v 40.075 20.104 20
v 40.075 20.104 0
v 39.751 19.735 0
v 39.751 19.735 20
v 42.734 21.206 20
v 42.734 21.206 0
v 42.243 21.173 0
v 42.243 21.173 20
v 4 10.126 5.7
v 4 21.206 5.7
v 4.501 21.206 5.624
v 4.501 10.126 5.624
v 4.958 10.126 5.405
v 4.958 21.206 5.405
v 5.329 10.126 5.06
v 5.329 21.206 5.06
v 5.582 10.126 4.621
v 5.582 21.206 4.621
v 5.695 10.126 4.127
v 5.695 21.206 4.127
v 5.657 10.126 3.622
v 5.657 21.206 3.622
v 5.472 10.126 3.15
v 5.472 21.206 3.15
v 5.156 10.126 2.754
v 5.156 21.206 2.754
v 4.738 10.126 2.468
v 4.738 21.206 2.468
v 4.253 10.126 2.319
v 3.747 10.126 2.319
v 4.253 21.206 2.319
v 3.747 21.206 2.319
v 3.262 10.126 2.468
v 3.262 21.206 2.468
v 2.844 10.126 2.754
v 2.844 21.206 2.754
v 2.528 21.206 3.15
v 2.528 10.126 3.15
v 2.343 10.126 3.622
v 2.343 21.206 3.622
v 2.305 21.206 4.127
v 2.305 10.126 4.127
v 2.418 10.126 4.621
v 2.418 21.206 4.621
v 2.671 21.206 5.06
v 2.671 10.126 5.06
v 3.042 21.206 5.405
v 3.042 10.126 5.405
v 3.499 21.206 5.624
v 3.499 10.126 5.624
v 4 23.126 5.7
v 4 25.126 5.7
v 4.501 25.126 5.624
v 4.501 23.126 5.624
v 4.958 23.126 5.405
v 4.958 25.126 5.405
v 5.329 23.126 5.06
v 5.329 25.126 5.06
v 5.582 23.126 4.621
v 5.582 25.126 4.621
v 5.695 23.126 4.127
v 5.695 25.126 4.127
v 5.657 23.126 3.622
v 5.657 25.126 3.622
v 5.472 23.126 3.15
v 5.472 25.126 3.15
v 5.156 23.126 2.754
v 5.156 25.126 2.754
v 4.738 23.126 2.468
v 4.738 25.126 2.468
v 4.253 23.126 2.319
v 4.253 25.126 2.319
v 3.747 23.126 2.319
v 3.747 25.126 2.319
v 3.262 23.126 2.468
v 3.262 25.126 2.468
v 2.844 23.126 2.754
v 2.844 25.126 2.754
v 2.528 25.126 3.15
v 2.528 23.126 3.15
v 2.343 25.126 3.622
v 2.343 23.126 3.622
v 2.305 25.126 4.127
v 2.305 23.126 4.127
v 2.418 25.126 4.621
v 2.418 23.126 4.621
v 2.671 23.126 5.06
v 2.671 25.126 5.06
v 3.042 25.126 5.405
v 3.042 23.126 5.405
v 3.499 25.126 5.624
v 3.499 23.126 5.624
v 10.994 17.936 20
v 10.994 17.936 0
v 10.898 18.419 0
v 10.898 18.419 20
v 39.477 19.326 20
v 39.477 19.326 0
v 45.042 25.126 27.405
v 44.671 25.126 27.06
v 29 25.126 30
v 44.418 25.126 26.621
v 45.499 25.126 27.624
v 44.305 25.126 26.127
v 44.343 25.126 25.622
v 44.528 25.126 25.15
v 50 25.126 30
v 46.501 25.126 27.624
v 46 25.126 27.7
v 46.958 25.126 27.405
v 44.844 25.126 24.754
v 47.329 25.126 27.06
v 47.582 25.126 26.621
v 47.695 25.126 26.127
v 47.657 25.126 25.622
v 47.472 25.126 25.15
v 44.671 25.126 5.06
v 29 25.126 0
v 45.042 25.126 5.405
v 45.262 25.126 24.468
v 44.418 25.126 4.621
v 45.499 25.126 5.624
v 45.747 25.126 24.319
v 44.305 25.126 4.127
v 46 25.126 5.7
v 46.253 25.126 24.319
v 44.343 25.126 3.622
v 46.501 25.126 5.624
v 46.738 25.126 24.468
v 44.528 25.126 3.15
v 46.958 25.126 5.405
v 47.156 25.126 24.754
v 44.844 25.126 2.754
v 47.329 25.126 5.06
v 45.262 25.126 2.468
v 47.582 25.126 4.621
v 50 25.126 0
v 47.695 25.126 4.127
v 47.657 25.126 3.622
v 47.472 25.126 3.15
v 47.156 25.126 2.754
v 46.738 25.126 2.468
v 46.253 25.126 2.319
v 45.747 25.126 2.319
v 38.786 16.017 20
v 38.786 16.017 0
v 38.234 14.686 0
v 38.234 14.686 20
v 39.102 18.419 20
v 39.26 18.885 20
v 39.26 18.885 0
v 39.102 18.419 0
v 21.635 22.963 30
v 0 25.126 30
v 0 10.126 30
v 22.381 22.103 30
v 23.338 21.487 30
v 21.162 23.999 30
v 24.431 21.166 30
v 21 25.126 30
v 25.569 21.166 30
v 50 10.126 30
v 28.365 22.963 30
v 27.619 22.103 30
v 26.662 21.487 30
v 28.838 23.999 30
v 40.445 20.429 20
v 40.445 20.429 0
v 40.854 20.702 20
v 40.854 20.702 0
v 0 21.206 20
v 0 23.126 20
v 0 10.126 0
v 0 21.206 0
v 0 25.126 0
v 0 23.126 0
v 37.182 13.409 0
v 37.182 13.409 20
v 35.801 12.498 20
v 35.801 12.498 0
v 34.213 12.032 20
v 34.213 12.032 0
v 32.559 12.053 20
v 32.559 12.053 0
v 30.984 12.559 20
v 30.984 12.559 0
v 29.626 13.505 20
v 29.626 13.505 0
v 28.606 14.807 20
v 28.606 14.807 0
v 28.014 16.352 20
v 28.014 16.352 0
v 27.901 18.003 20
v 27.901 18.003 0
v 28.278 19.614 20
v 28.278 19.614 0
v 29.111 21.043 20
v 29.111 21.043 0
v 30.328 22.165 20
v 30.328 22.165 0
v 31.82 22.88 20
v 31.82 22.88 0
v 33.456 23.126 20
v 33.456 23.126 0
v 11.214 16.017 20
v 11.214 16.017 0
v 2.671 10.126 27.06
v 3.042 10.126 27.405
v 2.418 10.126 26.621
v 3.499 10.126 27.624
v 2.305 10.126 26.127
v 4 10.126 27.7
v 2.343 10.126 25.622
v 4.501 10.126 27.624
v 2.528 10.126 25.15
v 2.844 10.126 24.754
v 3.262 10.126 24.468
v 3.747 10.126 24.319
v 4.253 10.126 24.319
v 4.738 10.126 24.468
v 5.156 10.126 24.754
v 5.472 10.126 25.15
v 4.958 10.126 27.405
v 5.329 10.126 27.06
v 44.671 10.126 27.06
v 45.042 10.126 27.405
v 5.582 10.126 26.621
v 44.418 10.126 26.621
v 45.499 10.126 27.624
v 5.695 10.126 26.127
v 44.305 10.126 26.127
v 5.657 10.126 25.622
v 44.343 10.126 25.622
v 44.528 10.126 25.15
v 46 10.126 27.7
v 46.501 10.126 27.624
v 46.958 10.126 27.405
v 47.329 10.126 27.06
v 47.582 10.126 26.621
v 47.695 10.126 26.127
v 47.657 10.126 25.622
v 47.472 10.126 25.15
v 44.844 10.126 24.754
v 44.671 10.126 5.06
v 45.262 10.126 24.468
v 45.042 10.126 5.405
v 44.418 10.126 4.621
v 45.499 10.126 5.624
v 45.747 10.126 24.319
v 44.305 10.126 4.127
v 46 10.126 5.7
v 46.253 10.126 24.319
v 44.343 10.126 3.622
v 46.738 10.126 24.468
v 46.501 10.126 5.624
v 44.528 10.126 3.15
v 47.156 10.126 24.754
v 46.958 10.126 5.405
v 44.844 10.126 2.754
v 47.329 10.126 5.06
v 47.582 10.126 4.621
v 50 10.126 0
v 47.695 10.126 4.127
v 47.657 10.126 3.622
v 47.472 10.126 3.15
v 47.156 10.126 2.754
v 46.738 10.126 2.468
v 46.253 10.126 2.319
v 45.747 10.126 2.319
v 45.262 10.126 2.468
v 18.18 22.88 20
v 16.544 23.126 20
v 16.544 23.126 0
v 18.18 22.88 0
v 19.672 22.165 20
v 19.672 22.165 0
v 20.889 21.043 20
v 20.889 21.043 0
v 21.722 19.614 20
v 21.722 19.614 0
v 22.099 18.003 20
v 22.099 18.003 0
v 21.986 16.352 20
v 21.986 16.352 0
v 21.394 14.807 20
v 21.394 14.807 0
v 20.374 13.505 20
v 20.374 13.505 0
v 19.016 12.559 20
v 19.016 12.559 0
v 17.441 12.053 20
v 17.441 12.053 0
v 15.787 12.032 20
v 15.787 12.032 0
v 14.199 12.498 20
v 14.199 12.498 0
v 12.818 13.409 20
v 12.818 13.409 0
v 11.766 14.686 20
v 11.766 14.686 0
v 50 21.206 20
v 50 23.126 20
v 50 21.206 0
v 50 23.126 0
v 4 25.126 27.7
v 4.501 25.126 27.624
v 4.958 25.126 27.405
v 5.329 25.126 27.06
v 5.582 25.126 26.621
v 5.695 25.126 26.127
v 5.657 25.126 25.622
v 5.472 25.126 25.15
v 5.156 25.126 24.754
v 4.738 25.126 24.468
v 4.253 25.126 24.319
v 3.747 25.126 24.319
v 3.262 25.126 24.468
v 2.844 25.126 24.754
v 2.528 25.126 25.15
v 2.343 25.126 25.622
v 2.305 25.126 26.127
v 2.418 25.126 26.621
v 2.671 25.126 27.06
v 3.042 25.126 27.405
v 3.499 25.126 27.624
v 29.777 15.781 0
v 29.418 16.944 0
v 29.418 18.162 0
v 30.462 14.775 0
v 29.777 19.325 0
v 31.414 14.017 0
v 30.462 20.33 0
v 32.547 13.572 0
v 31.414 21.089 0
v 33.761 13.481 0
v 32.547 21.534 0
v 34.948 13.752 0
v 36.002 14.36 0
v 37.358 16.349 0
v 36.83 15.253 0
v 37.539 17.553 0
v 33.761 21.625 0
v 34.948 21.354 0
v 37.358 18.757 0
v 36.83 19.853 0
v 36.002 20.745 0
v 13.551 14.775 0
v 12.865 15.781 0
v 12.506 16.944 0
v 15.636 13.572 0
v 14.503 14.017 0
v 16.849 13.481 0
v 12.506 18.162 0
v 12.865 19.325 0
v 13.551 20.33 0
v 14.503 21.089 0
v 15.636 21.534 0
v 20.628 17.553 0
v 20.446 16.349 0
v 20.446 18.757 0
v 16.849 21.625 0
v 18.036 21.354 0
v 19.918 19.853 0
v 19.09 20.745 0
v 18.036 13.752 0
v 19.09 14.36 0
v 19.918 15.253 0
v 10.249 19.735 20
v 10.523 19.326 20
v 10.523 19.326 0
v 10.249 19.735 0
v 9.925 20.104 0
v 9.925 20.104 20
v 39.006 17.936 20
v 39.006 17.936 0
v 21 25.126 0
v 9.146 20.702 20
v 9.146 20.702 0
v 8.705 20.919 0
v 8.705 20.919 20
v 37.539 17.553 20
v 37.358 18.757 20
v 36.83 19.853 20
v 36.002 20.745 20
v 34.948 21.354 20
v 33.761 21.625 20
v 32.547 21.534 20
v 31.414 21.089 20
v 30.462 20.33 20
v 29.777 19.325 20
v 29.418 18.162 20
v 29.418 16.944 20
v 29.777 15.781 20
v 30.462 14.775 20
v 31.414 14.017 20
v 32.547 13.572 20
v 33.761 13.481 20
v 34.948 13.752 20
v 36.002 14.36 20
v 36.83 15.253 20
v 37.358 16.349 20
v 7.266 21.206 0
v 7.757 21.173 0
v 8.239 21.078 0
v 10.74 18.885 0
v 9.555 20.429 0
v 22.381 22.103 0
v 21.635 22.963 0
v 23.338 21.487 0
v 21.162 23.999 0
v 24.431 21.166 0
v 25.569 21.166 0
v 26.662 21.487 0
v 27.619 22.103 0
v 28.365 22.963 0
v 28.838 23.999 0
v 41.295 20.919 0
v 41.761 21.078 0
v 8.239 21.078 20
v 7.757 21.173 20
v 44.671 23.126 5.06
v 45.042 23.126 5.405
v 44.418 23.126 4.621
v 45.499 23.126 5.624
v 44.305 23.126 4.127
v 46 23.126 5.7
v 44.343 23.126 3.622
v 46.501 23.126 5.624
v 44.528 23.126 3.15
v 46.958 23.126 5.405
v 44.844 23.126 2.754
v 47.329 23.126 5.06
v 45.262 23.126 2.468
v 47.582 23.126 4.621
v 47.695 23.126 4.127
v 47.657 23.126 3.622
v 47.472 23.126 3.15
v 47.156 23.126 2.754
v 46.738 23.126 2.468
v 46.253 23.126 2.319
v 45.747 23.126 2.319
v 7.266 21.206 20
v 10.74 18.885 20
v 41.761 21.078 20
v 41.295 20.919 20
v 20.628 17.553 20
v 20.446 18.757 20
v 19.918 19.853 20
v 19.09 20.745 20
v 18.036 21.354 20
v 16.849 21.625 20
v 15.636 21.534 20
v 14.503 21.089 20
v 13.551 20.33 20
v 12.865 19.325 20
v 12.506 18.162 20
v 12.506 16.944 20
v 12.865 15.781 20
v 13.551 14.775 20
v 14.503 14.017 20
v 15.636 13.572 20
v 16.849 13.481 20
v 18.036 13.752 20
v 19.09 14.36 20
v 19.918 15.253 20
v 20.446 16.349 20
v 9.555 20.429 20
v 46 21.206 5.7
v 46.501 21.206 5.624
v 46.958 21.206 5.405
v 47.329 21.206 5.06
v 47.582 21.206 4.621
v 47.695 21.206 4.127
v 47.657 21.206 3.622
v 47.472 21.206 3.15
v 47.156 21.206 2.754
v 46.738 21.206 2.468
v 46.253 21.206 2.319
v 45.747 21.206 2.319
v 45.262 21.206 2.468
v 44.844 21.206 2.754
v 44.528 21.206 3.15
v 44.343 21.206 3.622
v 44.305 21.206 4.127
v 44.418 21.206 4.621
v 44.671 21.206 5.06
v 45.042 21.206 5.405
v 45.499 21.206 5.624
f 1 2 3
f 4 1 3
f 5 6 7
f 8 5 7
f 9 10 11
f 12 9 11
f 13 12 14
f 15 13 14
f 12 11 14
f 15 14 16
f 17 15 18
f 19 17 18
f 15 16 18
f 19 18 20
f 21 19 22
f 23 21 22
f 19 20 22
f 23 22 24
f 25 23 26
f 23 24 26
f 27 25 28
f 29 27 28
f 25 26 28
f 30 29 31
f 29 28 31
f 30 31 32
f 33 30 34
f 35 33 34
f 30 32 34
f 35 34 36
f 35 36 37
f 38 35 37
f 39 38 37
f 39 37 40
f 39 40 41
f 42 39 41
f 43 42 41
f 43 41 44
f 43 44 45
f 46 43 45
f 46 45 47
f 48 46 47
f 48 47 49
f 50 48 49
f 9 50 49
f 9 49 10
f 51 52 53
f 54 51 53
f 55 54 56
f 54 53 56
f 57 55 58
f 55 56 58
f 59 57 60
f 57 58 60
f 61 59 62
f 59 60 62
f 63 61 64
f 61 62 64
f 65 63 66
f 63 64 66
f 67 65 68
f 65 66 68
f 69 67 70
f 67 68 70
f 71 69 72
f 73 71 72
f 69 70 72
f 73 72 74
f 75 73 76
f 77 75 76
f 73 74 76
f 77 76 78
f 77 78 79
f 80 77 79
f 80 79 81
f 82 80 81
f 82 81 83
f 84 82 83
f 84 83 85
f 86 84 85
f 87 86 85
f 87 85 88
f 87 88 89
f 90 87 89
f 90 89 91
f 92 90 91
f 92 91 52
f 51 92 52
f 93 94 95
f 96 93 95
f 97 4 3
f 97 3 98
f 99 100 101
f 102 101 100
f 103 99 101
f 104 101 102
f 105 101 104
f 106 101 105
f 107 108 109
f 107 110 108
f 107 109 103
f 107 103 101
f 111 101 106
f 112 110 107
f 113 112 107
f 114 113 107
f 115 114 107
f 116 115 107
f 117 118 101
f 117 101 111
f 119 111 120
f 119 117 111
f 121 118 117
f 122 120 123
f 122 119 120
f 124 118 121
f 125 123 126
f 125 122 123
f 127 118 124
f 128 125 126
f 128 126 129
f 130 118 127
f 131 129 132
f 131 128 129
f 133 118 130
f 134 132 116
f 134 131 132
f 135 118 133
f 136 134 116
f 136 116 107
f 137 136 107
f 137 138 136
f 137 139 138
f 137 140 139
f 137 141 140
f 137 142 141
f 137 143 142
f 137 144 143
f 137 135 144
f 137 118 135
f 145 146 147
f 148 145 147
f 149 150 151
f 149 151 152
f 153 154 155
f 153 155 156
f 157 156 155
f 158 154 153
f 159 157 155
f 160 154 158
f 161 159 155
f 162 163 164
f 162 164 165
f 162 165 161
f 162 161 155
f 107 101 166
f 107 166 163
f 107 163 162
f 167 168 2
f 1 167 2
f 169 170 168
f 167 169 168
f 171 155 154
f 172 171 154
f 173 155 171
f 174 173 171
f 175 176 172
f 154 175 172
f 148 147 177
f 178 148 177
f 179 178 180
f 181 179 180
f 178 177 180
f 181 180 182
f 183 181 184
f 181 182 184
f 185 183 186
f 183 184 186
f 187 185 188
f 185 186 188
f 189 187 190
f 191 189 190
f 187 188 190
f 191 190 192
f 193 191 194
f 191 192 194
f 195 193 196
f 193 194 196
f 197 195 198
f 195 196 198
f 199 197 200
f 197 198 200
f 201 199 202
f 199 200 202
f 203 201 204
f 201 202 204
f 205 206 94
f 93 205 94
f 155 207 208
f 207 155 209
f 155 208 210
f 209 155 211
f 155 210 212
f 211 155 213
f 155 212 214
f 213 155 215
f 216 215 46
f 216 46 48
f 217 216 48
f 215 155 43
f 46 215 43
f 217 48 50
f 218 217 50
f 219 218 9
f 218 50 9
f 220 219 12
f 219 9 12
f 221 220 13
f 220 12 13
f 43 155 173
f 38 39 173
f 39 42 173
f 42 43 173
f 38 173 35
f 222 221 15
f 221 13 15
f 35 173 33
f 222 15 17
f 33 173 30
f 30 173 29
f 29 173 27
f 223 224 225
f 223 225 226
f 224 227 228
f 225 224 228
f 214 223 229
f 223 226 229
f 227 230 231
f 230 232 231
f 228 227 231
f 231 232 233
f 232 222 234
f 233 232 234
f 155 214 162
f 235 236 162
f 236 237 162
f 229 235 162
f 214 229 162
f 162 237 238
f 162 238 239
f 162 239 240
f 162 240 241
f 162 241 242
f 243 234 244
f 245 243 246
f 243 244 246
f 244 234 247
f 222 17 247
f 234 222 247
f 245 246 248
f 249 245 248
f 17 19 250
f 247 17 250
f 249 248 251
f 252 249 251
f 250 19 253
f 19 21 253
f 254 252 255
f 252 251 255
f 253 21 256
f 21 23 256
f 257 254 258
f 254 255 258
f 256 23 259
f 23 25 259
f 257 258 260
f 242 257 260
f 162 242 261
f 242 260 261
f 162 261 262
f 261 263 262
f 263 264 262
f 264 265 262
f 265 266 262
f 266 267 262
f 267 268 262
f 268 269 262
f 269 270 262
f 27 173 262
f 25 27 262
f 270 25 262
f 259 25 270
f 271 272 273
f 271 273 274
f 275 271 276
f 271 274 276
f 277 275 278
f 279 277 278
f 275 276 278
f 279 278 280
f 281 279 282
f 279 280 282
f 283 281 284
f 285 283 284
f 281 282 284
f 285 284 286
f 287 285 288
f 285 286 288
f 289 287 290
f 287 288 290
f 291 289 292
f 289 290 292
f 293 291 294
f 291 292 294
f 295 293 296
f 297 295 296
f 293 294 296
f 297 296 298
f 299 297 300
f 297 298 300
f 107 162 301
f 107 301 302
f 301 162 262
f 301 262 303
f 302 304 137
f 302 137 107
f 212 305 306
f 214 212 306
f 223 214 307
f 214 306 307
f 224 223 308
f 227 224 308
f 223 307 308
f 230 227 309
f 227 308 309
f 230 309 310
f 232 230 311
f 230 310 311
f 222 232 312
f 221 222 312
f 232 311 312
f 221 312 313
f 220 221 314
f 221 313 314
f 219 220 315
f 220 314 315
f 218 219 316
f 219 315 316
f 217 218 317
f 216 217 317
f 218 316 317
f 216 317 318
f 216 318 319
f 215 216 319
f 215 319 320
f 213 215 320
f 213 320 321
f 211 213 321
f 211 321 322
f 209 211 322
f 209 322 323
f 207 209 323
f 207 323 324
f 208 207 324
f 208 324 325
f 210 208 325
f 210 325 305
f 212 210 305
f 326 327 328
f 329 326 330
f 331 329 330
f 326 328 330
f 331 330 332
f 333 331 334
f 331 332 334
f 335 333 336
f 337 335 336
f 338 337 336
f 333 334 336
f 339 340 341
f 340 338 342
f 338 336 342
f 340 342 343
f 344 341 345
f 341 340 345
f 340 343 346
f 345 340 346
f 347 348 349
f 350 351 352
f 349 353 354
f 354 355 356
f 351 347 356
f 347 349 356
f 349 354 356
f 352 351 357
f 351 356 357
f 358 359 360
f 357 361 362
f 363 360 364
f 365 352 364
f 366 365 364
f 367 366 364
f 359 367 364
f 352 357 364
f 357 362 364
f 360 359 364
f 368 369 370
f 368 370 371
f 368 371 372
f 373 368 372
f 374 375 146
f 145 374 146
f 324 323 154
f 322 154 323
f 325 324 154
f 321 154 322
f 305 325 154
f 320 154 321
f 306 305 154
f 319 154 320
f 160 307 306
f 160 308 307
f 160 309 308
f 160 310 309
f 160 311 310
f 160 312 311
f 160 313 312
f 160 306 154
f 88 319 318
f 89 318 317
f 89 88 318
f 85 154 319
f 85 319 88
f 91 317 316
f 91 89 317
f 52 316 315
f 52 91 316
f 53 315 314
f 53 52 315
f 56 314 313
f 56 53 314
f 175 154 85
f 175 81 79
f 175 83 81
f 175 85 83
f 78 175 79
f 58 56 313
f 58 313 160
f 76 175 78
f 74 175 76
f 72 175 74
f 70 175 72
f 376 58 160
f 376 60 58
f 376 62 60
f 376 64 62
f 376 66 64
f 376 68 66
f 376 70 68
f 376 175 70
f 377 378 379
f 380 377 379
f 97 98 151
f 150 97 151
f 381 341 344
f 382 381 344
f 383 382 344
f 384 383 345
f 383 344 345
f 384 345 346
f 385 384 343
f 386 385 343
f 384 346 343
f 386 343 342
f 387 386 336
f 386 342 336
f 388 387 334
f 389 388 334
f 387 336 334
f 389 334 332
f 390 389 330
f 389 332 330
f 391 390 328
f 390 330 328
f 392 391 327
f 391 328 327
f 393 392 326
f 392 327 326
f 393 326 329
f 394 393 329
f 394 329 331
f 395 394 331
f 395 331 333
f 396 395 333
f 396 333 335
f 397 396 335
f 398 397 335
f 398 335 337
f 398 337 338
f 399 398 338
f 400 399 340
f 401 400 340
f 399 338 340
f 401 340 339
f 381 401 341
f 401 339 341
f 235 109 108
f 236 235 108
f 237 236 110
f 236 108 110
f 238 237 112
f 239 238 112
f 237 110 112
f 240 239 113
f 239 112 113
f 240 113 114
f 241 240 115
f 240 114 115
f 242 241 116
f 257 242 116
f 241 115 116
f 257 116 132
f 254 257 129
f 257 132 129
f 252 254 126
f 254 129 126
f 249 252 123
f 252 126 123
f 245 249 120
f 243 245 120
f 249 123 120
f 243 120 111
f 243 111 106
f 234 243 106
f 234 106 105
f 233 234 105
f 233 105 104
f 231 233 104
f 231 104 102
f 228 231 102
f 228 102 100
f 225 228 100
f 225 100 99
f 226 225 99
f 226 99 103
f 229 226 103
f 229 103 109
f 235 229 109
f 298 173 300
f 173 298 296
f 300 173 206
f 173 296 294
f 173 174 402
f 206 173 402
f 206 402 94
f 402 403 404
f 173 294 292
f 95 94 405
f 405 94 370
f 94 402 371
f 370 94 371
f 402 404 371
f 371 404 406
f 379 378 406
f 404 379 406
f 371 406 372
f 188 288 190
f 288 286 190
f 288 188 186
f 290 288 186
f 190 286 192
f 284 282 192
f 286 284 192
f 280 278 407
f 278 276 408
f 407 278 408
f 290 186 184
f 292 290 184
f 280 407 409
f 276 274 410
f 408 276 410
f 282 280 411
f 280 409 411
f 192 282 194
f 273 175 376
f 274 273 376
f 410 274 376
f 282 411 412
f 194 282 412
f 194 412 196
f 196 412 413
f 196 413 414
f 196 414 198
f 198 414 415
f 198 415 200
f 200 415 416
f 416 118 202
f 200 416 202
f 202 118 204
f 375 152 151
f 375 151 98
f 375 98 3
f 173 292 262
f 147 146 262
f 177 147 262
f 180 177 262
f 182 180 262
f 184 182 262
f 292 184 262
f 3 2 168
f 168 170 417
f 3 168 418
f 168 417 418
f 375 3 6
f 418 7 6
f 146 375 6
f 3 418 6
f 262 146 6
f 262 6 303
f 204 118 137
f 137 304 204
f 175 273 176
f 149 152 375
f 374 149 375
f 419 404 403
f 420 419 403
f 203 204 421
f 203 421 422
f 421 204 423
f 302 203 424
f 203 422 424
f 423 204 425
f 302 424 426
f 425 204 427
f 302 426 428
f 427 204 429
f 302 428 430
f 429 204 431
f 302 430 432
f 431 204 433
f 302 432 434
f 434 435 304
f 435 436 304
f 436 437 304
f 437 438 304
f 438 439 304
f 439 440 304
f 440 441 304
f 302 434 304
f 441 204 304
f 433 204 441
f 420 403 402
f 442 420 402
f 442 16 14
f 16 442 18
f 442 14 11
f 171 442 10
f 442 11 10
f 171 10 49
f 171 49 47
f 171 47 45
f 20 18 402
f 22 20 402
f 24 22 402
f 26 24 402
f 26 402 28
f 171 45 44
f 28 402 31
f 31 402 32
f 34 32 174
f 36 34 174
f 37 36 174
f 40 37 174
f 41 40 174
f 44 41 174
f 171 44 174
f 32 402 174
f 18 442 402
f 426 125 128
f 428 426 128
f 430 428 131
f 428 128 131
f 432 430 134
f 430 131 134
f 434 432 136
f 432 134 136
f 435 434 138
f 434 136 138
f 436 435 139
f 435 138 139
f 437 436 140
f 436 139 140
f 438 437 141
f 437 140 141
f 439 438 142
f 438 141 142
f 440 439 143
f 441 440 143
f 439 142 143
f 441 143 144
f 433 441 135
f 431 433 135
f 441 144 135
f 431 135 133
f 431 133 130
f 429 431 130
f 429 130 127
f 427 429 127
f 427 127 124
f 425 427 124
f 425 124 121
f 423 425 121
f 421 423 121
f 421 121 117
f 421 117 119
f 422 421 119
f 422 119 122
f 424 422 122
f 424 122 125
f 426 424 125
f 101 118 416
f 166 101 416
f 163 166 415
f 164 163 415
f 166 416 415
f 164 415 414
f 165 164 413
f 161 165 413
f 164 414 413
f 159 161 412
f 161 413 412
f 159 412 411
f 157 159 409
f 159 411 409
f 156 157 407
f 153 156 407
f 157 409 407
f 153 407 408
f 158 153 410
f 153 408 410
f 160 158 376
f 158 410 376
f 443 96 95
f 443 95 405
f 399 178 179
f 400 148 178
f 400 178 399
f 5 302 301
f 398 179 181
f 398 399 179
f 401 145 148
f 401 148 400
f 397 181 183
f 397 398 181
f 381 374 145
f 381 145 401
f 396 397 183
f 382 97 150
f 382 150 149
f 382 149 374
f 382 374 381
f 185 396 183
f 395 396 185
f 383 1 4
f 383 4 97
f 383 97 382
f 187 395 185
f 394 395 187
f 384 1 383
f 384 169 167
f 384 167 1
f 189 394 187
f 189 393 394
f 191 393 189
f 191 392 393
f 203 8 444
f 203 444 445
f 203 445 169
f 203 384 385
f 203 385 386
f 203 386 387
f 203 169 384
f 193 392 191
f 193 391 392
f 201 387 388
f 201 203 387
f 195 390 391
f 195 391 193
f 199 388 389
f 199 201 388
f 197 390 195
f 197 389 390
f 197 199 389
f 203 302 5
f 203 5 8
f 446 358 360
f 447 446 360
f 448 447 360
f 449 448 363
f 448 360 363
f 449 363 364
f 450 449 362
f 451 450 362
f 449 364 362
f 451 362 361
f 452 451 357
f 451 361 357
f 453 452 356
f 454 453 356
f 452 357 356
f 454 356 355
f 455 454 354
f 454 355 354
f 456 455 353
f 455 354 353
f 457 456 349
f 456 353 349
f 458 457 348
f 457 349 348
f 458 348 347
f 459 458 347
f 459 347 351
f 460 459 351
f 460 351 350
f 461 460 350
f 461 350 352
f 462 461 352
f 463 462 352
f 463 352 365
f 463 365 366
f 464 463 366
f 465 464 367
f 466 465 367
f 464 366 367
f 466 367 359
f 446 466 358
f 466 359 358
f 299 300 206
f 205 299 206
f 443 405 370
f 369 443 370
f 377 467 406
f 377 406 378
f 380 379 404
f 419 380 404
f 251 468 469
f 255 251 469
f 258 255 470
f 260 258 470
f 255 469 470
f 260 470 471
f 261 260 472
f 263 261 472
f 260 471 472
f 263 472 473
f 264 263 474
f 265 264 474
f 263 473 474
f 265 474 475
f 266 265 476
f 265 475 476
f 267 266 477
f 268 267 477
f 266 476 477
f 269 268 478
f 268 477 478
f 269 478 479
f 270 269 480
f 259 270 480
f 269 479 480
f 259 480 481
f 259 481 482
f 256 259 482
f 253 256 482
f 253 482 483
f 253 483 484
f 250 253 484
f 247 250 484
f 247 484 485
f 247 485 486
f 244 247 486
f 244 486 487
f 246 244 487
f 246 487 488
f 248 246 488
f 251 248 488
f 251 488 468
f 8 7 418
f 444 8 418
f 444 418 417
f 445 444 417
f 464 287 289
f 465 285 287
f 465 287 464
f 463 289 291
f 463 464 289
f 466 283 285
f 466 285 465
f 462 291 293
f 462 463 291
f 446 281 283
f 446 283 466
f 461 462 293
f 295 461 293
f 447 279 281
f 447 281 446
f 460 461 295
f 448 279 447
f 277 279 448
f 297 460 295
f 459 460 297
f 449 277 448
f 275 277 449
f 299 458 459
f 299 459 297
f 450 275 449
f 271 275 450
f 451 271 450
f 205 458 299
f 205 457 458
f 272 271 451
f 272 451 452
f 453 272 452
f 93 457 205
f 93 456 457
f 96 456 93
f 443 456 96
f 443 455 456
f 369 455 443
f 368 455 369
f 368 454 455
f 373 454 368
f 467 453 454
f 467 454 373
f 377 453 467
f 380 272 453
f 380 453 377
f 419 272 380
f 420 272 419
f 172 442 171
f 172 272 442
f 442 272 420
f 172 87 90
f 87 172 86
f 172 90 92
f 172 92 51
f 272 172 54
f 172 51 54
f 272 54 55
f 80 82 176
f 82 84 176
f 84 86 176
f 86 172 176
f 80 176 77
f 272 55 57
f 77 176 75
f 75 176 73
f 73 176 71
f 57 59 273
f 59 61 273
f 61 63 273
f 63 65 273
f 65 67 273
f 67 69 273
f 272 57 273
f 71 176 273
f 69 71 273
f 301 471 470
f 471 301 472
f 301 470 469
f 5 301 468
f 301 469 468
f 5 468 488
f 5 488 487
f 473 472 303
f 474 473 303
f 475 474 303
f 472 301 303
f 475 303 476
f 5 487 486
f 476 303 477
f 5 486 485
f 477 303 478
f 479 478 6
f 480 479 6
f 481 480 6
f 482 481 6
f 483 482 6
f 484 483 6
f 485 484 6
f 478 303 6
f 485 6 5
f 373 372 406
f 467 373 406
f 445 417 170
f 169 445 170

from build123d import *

# Parameters (mm, degrees)
SCHIZZO1_W                   = 50
SCHIZZO1_H                   = 15
ESTRUSIONE_ESTRUSIONE1_DEPTH = 30
SCHIZZO2_R                   = 4.08343654
TAGLIO_ESTRUSIONE1_DEPTH     = 20
SCHIZZO6_R                   = 1.7
TAGLIO_ESTRUSIONE3_DEPTH     = 30
SCHIZZO9_R                   = 4
TAGLIO_ESTRUSIONE5_DEPTH     = 64.492497112


with BuildPart() as part:
    # Schizzo1 → Estrusione-Estrusione1 (new body)
    with BuildSketch(Plane.XY):
        with Locations((25, 17.625628141)):
            Rectangle(SCHIZZO1_W, SCHIZZO1_H)
    extrude(amount=ESTRUSIONE_ESTRUSIONE1_DEPTH)

    # Schizzo2 → Taglio-Estrusione1 (cut)
    # profile 1 of 2: a face of its own
    with BuildSketch(Plane.XY):
        with BuildLine():
            ThreePointArc((16.544218644, 23.125628141), (21.393626777, 14.807370827), (11.765784724, 14.685627772))
            Line((11.765784724, 14.685627772), (11.214334392, 16.016946643))
            Line((11.214334392, 16.016946643), (10.994077631, 17.936406255))
            Line((10.994077631, 17.936406255), (10.89812606, 18.418787382))
            Line((10.89812606, 18.418787382), (10.740031995, 18.884517478))
            Line((10.740031995, 18.884517478), (10.522500471, 19.325627772))
            Line((10.522500471, 19.325627772), (10.249253512, 19.734570745))
            Line((10.249253512, 19.734570745), (9.92496645, 20.10434927))
            Line((9.92496645, 20.10434927), (9.555187926, 20.428636332))
            Line((9.555187926, 20.428636332), (9.146244953, 20.701883291))
            Line((9.146244953, 20.701883291), (8.705134658, 20.919414815))
            Line((8.705134658, 20.919414815), (8.239404562, 21.077508879))
            Line((8.239404562, 21.077508879), (7.757023435, 21.173460451))
            Line((7.757023435, 21.173460451), (7.266244953, 21.205627772))
            Line((7.266244953, 21.205627772), (-0.789507737, 21.205627772))
            Line((-0.789507737, 21.205627772), (-0.789507737, 23.125628141))
            Line((-0.789507737, 23.125628141), (16.544218644, 23.125628141))
        make_face()
        with Locations((16.544218644, 17.552936622)):
            Circle(SCHIZZO2_R, mode=Mode.SUBTRACT)
    # profile 2 of 2: a face of its own
    with BuildSketch(Plane.XY):
        with BuildLine():
            Line((33.455781356, 23.125628141), (50.789507737, 23.125628141))
            Line((50.789507737, 23.125628141), (50.789507737, 21.205627772))
            Line((50.789507737, 21.205627772), (42.733755047, 21.205627772))
            Line((42.733755047, 21.205627772), (42.242976565, 21.173460451))
            Line((42.242976565, 21.173460451), (41.760595438, 21.077508879))
            Line((41.760595438, 21.077508879), (41.294865342, 20.919414815))
            Line((41.294865342, 20.919414815), (40.853755047, 20.701883291))
            Line((40.853755047, 20.701883291), (40.444812074, 20.428636332))
            Line((40.444812074, 20.428636332), (40.07503355, 20.10434927))
            Line((40.07503355, 20.10434927), (39.750746488, 19.734570745))
            Line((39.750746488, 19.734570745), (39.477499529, 19.325627772))
            Line((39.477499529, 19.325627772), (39.259968005, 18.884517478))
            Line((39.259968005, 18.884517478), (39.10187394, 18.418787382))
            Line((39.10187394, 18.418787382), (39.005922369, 17.936406255))
            Line((39.005922369, 17.936406255), (38.785665608, 16.016946643))
            Line((38.785665608, 16.016946643), (38.234215276, 14.685627772))
            ThreePointArc((38.234215276, 14.685627772), (28.606373223, 14.807370827), (33.455781356, 23.125628141))
        make_face()
        with Locations((33.455781356, 17.552936622)):
            Circle(SCHIZZO2_R, mode=Mode.SUBTRACT)
    extrude(amount=TAGLIO_ESTRUSIONE1_DEPTH, mode=Mode.SUBTRACT)

    # Schizzo6 → Taglio-Estrusione3 (cut)
    with BuildSketch(Plane(origin=(0, 25.125628141, 0), x_dir=(1, 0, 0), z_dir=(0, 1, 0))):
        with Locations(Location((4, -4, 0), (0, 0, 270))):
            Circle(SCHIZZO6_R)
        with Locations(Location((46, -4, 0), (0, 0, 270))):
            Circle(SCHIZZO6_R)
        with Locations(Location((46, -26, 0), (0, 0, 270))):
            Circle(SCHIZZO6_R)
        with Locations(Location((4, -26, 0), (0, 0, 270))):
            Circle(SCHIZZO6_R)
    extrude(amount=-TAGLIO_ESTRUSIONE3_DEPTH, mode=Mode.SUBTRACT)

    # Schizzo9 → Taglio-Estrusione5 (cut, through all)
    with BuildSketch(Plane(origin=(0, 0, 0), x_dir=(-1, 0, 0), z_dir=(0, 0, -1))):
        with Locations((-25, 25.125628141)):
            Circle(SCHIZZO9_R)
    extrude(amount=-TAGLIO_ESTRUSIONE5_DEPTH, mode=Mode.SUBTRACT)


solid = part.part
